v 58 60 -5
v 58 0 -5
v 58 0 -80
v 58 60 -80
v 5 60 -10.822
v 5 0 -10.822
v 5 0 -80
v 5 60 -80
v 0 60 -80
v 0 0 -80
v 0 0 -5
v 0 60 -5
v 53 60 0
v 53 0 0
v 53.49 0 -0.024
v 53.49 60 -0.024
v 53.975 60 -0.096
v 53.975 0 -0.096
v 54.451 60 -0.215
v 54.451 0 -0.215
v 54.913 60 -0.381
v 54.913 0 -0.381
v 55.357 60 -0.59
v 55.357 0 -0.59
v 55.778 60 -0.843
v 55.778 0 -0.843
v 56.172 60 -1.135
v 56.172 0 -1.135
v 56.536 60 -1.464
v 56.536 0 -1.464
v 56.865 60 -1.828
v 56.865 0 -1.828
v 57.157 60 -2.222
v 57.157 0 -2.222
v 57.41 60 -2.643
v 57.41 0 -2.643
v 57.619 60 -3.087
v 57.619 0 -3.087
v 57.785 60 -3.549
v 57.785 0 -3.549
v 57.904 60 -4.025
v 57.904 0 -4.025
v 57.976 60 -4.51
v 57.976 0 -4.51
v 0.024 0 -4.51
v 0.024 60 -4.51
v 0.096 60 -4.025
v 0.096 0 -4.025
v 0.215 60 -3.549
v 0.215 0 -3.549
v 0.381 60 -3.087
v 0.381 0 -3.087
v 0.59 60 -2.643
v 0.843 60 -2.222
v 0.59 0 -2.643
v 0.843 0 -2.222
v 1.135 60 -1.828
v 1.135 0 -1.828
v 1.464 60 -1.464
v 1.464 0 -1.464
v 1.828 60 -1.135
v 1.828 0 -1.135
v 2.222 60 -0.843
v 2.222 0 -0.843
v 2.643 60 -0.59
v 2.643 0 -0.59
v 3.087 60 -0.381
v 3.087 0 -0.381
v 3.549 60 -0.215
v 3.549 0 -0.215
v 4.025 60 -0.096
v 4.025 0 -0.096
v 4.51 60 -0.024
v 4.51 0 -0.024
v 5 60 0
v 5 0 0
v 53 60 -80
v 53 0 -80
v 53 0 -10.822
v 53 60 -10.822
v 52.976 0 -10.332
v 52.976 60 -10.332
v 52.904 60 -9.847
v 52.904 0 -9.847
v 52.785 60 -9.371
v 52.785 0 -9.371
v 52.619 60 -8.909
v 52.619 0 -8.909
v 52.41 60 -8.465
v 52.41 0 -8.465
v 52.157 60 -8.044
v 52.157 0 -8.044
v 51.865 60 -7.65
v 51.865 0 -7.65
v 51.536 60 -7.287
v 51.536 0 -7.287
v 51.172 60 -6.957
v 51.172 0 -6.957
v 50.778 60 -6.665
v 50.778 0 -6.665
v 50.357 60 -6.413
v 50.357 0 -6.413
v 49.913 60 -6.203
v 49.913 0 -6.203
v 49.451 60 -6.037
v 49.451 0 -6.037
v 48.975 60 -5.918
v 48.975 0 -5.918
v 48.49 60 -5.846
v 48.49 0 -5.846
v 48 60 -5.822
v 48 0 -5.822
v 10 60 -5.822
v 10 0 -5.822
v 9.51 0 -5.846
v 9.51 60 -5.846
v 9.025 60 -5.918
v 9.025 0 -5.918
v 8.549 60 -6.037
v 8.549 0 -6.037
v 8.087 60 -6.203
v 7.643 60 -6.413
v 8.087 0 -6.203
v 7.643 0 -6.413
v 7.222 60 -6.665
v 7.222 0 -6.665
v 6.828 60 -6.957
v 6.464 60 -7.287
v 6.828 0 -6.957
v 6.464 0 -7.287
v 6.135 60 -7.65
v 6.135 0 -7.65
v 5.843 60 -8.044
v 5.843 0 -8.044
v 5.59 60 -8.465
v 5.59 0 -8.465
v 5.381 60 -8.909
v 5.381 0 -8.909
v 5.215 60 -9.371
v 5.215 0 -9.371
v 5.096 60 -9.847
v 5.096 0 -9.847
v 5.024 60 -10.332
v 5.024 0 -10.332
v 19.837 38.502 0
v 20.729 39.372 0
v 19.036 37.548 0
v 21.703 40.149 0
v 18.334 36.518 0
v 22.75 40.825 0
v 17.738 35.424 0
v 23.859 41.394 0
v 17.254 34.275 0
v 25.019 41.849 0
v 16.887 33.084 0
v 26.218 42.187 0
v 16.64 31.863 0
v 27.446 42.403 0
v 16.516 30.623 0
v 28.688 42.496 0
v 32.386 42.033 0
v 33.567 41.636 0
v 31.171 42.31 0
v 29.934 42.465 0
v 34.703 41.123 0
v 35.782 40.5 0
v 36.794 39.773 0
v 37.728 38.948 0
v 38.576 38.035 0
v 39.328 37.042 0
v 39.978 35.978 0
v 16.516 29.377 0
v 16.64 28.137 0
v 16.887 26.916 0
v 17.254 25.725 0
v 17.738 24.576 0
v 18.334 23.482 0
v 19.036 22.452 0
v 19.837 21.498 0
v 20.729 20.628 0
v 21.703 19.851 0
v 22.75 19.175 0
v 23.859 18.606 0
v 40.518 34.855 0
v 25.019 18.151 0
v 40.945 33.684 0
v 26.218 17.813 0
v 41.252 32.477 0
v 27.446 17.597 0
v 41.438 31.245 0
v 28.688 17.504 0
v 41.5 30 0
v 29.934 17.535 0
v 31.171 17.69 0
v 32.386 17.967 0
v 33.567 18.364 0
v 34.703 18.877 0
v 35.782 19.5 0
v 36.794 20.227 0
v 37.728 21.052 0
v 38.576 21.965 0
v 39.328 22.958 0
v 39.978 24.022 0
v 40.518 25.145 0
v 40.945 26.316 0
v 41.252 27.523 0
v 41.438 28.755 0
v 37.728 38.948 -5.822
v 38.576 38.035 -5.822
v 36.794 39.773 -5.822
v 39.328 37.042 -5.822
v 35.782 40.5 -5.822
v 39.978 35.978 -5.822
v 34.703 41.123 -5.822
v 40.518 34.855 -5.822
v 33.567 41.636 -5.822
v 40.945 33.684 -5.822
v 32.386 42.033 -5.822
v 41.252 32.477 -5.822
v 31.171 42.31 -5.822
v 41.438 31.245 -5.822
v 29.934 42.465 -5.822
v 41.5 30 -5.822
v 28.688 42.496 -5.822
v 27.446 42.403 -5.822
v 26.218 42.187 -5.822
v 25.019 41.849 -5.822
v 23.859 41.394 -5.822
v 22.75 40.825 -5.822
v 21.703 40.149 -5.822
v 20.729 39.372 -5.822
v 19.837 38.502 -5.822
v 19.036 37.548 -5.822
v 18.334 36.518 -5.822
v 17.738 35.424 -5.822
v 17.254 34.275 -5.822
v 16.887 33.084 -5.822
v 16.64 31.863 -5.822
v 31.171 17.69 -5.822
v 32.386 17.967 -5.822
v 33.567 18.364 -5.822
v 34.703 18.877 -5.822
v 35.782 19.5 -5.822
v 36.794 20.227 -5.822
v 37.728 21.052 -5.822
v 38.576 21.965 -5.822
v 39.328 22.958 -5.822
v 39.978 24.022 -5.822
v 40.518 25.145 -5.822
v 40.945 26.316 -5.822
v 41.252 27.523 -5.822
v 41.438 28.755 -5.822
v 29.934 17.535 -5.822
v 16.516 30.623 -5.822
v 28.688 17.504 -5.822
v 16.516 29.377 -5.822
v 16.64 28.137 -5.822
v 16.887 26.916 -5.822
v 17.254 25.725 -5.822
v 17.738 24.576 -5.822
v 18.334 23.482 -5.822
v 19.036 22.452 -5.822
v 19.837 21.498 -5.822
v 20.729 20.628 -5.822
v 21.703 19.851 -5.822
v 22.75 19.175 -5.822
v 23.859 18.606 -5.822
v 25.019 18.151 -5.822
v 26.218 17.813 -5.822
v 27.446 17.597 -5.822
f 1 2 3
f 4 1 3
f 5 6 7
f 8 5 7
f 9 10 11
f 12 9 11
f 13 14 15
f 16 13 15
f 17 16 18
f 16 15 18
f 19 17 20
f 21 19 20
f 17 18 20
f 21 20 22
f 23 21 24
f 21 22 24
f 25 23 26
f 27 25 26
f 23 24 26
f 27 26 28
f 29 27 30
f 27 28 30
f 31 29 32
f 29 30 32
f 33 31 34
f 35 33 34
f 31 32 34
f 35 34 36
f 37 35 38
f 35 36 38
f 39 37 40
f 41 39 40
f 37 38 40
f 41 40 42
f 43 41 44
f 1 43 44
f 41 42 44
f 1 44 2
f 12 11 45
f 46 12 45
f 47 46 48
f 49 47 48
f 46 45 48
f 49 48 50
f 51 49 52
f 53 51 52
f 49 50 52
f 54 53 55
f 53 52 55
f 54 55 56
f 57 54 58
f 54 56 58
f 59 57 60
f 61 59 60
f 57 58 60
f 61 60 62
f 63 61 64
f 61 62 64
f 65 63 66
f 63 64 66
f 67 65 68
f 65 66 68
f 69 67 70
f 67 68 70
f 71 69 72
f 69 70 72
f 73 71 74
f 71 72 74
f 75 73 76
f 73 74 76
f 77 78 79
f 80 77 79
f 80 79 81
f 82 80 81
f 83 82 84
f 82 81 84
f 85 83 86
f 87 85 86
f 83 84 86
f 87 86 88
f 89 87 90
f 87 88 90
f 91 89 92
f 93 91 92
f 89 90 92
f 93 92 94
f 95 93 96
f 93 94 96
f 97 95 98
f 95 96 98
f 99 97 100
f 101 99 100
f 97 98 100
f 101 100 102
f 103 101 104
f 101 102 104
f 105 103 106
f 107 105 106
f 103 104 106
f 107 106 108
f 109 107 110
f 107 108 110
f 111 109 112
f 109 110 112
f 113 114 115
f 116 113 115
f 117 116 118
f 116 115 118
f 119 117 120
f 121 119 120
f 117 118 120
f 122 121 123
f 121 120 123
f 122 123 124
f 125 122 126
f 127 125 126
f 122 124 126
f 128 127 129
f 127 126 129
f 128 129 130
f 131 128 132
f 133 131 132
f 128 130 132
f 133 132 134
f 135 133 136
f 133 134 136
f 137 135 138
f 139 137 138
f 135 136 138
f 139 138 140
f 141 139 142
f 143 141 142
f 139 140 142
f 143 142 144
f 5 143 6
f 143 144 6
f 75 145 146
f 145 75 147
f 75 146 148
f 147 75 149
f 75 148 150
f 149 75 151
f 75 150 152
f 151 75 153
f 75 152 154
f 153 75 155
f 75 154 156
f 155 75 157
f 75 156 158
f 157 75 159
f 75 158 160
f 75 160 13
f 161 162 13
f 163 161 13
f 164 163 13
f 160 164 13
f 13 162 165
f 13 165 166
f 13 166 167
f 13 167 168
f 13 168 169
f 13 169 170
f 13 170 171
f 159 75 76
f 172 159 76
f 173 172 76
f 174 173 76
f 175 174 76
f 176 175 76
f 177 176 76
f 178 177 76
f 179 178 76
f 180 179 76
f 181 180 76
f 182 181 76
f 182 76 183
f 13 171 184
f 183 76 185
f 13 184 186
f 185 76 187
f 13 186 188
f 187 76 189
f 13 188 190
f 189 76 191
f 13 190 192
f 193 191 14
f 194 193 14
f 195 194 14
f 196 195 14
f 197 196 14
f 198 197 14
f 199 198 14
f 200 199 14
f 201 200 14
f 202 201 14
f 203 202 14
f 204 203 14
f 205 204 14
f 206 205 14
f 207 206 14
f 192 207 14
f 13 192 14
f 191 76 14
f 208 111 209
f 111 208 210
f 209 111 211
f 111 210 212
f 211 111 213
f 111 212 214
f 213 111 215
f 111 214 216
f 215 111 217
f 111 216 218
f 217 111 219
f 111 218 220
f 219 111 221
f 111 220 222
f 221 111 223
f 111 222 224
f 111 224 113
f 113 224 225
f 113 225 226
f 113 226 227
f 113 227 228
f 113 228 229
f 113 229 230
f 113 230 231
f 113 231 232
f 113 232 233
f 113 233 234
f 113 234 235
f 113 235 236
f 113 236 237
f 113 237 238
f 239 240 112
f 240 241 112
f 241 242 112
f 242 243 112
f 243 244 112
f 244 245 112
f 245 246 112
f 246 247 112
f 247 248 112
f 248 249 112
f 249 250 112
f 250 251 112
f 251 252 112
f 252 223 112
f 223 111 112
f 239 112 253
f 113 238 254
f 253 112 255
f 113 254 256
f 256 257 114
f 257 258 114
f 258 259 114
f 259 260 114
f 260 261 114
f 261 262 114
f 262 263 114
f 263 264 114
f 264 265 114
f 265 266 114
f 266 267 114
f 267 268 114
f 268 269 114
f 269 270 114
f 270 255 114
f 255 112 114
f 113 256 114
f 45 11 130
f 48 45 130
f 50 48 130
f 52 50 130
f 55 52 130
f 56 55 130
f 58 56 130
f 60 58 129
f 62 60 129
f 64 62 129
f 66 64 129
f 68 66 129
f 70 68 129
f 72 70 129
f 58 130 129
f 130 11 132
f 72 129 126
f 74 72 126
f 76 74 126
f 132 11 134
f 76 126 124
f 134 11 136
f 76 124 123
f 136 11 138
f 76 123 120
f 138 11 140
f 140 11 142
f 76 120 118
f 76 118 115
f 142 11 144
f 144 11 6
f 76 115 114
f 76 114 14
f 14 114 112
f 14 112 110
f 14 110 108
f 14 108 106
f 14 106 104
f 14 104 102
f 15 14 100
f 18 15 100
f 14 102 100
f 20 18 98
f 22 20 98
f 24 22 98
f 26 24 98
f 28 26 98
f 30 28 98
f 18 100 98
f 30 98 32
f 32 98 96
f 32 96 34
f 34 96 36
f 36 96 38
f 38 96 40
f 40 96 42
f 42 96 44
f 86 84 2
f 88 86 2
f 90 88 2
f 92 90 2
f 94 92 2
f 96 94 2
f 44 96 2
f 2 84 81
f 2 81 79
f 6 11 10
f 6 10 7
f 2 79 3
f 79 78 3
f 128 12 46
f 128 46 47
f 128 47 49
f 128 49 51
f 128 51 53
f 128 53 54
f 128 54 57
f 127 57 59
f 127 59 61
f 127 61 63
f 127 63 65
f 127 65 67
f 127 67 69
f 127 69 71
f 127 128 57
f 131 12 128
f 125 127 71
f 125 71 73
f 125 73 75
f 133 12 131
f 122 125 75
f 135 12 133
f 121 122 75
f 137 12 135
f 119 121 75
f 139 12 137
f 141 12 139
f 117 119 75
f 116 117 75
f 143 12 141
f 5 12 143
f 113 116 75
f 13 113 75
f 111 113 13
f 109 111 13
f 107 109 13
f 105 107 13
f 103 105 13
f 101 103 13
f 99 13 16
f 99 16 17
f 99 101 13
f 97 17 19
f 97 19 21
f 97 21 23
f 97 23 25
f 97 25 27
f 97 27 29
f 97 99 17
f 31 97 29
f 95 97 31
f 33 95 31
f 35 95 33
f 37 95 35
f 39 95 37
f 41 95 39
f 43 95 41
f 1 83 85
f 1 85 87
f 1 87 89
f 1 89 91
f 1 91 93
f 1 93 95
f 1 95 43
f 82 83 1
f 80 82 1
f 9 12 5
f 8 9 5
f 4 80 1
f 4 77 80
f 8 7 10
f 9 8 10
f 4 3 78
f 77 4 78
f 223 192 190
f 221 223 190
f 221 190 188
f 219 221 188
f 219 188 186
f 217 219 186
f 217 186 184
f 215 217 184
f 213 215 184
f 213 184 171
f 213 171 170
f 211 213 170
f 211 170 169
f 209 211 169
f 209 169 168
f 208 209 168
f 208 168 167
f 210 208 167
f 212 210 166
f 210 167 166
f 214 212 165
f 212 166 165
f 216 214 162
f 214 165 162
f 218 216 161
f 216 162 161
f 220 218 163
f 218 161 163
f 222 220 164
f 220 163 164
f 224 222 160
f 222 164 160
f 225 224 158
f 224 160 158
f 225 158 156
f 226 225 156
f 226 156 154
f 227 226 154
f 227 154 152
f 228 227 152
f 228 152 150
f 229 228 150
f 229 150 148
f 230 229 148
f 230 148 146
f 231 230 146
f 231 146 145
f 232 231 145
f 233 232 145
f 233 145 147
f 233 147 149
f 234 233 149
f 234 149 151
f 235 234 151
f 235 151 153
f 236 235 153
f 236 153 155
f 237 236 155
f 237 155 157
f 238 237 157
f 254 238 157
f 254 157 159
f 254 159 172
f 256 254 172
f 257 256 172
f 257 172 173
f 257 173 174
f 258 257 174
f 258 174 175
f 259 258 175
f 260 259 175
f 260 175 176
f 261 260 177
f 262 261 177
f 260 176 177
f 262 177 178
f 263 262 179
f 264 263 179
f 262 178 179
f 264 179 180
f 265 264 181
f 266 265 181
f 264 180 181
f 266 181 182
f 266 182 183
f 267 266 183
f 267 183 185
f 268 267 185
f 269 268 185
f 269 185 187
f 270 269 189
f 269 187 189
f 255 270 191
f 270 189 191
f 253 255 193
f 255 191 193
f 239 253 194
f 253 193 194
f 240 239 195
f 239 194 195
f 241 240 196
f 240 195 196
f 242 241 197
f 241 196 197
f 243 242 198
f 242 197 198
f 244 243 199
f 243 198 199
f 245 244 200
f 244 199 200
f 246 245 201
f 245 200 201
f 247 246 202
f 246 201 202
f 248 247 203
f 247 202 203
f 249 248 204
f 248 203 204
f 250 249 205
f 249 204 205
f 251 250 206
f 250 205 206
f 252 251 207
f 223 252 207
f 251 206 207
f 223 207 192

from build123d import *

# Parameters (mm, degrees)
EXTRUDE_1_DEPTH     = 60
SKETCH_2_R          = 12.5
CUT_EXTRUDE_1_DEPTH = 81


with BuildPart() as part:
    # Эскиз1 → Бобышка-Вытянуть1 (new body)
    with BuildSketch(Plane(origin=(0, 0, 0), x_dir=(1, 0, 0), z_dir=(0, 1, 0))):
        with BuildLine():
            Line((0, 80), (0, 5))
            ThreePointArc((0, 5), (1.464466094, 1.464466094), (5, 0))
            Line((5, 0), (53, 0))
            ThreePointArc((53, 0), (56.535533906, 1.464466094), (58, 5))
            Line((58, 5), (58, 80))
            Line((58, 80), (53, 80))
            Line((53, 80), (53, 10.822157735))
            ThreePointArc((53, 10.822157735), (51.535533906, 7.286623829), (48, 5.822157735))
            Line((48, 5.822157735), (10, 5.822157735))
            ThreePointArc((10, 5.822157735), (6.464466094, 7.286623829), (5, 10.822157735))
            Line((5, 10.822157735), (5, 80))
            Line((5, 80), (0, 80))
        make_face()
    extrude(amount=EXTRUDE_1_DEPTH)

    # Эскиз2 → Вырез-Вытянуть1 (cut, through all)
    with BuildSketch(Plane.XY):
        with Locations((29, 30)):
            Circle(SKETCH_2_R)
    extrude(amount=-CUT_EXTRUDE_1_DEPTH, mode=Mode.SUBTRACT)


solid = part.part
